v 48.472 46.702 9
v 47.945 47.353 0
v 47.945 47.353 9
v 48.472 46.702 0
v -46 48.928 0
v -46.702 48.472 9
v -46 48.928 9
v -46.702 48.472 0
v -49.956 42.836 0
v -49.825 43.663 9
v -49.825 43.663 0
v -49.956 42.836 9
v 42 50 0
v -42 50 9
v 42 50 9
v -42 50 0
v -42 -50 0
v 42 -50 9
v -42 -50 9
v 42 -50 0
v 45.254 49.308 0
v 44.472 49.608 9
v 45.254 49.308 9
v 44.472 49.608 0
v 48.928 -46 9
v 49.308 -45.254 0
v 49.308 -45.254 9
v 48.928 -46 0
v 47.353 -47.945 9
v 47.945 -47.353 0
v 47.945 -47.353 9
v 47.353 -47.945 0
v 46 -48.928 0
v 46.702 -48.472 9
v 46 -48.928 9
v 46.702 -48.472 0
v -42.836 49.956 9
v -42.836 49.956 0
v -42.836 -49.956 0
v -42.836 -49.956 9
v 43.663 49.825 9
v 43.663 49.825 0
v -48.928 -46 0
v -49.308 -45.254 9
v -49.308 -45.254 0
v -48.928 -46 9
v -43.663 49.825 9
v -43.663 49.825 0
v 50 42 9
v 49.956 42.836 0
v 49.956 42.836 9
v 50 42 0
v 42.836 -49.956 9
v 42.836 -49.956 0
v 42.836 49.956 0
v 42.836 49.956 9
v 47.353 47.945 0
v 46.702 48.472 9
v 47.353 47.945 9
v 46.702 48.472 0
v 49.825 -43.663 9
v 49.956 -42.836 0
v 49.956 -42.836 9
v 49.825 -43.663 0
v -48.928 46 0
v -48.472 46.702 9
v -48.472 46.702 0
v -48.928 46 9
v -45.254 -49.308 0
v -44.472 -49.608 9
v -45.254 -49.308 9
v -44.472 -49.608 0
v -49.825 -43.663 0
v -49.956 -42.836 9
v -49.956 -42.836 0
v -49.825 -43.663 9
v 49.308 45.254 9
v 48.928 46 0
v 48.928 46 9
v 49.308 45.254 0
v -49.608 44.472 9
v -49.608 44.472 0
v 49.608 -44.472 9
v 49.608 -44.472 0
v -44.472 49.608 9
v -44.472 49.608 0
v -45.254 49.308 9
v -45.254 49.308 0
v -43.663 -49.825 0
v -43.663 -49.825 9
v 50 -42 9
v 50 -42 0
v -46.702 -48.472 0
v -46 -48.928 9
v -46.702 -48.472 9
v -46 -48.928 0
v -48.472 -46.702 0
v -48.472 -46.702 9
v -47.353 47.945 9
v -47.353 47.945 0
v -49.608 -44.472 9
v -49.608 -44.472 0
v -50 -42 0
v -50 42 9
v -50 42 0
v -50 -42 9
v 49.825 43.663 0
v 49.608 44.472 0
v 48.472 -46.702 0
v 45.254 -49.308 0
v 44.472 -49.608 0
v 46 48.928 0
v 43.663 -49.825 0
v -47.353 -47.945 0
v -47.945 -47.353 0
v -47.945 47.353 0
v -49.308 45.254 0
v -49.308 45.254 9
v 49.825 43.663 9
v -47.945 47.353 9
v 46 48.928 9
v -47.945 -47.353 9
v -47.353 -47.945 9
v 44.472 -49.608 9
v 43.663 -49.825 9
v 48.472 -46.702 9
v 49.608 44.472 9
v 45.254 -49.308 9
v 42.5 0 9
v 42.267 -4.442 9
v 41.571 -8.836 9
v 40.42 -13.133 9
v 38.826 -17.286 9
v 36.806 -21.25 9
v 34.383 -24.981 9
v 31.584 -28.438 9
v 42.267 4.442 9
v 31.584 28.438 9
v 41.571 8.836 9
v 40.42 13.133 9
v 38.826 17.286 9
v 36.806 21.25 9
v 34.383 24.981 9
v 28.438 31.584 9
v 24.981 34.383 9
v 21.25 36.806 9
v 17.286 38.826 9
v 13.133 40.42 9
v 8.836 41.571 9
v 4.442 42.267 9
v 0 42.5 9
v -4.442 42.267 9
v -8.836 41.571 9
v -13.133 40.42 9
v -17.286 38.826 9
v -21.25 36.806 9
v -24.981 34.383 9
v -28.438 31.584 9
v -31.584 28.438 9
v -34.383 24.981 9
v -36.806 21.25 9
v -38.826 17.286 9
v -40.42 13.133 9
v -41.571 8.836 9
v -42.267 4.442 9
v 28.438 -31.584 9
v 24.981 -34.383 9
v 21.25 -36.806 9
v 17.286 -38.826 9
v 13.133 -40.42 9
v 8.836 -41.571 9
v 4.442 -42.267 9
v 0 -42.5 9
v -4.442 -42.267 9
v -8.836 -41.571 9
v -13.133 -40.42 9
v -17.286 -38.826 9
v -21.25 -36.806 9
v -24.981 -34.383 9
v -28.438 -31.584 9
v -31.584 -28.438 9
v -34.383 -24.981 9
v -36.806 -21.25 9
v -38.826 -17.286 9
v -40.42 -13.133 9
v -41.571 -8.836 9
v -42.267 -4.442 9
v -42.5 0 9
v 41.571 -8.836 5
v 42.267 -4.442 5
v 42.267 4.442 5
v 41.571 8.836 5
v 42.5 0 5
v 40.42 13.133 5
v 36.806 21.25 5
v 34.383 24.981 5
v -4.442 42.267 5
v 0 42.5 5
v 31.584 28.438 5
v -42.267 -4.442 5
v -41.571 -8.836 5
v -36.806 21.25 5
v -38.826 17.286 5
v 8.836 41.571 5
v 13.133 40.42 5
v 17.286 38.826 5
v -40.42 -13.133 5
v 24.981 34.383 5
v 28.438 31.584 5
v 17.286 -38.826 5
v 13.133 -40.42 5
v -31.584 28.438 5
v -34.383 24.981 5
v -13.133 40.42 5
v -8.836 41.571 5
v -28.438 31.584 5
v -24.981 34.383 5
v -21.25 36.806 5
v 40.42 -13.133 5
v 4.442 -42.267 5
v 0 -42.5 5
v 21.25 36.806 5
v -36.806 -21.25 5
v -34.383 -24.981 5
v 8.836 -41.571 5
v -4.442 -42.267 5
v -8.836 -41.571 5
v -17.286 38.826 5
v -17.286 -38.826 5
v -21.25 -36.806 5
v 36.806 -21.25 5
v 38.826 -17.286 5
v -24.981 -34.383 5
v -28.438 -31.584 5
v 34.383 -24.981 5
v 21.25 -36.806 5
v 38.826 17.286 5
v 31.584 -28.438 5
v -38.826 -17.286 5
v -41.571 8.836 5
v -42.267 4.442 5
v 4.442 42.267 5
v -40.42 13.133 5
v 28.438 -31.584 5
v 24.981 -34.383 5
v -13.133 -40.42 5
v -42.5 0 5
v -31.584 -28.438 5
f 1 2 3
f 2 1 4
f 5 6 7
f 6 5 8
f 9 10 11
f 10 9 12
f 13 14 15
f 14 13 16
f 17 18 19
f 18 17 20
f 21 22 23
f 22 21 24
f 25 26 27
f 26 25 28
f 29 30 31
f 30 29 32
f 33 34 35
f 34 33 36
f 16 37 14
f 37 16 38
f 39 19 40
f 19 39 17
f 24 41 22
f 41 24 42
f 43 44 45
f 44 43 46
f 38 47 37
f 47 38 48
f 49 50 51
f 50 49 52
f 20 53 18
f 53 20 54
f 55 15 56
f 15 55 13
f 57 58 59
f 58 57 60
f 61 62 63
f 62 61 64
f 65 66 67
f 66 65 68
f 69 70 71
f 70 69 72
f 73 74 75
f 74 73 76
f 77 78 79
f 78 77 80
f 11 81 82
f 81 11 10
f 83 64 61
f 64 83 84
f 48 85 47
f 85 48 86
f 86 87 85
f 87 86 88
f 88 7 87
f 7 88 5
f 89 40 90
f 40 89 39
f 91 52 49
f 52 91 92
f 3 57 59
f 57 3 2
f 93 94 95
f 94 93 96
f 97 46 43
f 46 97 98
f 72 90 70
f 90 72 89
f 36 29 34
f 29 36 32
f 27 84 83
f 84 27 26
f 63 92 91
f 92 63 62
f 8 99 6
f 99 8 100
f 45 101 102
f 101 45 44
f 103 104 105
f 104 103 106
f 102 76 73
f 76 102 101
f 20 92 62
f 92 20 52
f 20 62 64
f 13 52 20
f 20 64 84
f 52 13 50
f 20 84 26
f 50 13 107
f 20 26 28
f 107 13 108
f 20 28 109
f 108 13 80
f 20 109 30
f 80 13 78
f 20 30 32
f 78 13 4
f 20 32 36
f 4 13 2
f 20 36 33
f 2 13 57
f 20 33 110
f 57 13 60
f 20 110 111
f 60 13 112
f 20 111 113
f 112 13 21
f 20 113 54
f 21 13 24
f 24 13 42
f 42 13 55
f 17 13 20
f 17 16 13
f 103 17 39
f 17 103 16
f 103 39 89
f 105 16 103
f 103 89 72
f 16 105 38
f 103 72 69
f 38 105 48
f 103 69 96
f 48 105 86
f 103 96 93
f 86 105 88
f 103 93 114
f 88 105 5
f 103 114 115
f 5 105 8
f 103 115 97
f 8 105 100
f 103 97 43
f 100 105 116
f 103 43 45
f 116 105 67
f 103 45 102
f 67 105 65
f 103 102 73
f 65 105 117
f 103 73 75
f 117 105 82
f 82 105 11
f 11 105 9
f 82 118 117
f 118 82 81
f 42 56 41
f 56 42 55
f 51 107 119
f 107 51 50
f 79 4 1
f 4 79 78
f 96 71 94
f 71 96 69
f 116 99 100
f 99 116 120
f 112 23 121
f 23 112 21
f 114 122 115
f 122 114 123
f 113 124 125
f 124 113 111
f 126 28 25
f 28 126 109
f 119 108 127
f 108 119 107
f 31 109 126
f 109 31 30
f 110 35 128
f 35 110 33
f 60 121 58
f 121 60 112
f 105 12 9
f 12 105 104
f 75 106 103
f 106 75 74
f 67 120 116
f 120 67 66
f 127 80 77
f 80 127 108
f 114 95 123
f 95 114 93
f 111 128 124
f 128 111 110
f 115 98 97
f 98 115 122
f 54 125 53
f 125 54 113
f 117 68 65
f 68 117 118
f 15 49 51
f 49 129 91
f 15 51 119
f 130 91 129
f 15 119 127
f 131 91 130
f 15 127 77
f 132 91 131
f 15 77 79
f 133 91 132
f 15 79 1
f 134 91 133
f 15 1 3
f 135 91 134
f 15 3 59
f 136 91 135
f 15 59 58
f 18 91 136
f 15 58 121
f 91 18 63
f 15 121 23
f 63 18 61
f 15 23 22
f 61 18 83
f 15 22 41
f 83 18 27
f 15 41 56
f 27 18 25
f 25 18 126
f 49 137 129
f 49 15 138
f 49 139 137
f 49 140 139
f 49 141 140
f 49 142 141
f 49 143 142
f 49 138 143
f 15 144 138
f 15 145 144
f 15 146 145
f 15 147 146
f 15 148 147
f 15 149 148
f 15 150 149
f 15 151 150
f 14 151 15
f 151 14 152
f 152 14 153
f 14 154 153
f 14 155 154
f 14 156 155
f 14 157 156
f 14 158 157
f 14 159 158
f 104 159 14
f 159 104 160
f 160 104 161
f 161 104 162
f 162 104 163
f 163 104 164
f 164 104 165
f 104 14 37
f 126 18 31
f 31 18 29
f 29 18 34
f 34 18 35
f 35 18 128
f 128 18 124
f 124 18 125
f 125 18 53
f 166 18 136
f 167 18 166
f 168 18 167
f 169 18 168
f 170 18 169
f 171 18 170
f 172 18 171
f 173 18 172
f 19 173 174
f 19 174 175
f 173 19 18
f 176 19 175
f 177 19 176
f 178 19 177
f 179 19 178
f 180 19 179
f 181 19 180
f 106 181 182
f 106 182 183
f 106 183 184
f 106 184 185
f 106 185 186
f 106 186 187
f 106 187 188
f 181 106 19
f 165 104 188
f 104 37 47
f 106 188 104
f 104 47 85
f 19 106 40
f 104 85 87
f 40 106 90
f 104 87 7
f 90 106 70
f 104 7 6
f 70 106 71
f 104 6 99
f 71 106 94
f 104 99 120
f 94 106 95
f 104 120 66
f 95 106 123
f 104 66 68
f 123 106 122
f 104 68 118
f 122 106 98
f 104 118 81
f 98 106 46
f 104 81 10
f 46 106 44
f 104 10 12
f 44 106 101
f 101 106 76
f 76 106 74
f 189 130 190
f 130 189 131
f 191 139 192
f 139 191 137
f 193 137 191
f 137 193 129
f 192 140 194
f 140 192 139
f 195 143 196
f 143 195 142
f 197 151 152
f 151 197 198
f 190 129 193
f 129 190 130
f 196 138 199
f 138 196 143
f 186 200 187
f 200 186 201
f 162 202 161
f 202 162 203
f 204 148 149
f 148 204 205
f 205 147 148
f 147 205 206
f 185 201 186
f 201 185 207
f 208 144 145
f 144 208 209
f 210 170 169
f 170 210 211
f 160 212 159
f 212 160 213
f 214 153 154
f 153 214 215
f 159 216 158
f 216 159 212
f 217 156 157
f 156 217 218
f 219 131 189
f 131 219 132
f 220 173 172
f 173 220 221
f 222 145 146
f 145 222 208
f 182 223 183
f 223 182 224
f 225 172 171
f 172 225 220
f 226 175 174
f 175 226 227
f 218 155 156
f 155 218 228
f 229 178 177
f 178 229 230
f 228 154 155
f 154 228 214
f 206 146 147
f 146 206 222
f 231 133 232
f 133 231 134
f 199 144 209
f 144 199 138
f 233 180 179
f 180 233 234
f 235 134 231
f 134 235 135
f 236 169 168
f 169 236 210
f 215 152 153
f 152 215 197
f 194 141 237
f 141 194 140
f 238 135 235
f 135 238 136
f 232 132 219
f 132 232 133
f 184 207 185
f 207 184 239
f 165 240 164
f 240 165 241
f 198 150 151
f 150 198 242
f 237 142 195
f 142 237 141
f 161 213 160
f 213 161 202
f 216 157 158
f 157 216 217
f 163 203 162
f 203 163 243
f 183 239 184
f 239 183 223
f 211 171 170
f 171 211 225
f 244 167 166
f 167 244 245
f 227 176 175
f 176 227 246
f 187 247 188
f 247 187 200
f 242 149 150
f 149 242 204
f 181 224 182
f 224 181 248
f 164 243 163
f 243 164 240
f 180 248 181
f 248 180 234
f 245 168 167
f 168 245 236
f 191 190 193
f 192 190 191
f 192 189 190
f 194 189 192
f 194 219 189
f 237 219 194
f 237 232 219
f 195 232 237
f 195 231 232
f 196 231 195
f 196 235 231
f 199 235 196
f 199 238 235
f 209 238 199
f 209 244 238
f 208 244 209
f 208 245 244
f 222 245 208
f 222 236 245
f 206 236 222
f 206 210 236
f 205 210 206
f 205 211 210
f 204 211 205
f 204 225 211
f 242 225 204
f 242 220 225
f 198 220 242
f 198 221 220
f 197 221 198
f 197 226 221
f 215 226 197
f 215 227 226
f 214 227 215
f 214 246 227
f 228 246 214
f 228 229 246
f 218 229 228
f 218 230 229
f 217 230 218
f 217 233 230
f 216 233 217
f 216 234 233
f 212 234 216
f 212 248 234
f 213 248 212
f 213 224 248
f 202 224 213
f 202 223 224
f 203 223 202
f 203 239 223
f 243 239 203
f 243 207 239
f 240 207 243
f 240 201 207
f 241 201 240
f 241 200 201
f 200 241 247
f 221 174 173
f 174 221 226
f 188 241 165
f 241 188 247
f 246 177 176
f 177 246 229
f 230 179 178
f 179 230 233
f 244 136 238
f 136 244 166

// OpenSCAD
$fn=60;

total_len = 100;
corner_radius = 8;


module coaster(len, height, radius) {
  difference() {
    
    hull() {
      translate([-(len/2)+radius, -(len/2)+radius, 0]) cylinder(h=height, r=radius);
      translate([(len/2)-radius, -(len/2)+radius, 0]) cylinder(h=height, r=radius);
      translate([-(len/2)+radius, (len/2)-radius, 0]) cylinder(h=height, r=radius);
      translate([(len/2)-radius, (len/2)-radius, 0]) cylinder(h=height, r=radius);
    }

    translate([0, 0, height-4]) cylinder(h=4.1, d=85);
  }
}

coaster(len=100, height=9, radius=8);
